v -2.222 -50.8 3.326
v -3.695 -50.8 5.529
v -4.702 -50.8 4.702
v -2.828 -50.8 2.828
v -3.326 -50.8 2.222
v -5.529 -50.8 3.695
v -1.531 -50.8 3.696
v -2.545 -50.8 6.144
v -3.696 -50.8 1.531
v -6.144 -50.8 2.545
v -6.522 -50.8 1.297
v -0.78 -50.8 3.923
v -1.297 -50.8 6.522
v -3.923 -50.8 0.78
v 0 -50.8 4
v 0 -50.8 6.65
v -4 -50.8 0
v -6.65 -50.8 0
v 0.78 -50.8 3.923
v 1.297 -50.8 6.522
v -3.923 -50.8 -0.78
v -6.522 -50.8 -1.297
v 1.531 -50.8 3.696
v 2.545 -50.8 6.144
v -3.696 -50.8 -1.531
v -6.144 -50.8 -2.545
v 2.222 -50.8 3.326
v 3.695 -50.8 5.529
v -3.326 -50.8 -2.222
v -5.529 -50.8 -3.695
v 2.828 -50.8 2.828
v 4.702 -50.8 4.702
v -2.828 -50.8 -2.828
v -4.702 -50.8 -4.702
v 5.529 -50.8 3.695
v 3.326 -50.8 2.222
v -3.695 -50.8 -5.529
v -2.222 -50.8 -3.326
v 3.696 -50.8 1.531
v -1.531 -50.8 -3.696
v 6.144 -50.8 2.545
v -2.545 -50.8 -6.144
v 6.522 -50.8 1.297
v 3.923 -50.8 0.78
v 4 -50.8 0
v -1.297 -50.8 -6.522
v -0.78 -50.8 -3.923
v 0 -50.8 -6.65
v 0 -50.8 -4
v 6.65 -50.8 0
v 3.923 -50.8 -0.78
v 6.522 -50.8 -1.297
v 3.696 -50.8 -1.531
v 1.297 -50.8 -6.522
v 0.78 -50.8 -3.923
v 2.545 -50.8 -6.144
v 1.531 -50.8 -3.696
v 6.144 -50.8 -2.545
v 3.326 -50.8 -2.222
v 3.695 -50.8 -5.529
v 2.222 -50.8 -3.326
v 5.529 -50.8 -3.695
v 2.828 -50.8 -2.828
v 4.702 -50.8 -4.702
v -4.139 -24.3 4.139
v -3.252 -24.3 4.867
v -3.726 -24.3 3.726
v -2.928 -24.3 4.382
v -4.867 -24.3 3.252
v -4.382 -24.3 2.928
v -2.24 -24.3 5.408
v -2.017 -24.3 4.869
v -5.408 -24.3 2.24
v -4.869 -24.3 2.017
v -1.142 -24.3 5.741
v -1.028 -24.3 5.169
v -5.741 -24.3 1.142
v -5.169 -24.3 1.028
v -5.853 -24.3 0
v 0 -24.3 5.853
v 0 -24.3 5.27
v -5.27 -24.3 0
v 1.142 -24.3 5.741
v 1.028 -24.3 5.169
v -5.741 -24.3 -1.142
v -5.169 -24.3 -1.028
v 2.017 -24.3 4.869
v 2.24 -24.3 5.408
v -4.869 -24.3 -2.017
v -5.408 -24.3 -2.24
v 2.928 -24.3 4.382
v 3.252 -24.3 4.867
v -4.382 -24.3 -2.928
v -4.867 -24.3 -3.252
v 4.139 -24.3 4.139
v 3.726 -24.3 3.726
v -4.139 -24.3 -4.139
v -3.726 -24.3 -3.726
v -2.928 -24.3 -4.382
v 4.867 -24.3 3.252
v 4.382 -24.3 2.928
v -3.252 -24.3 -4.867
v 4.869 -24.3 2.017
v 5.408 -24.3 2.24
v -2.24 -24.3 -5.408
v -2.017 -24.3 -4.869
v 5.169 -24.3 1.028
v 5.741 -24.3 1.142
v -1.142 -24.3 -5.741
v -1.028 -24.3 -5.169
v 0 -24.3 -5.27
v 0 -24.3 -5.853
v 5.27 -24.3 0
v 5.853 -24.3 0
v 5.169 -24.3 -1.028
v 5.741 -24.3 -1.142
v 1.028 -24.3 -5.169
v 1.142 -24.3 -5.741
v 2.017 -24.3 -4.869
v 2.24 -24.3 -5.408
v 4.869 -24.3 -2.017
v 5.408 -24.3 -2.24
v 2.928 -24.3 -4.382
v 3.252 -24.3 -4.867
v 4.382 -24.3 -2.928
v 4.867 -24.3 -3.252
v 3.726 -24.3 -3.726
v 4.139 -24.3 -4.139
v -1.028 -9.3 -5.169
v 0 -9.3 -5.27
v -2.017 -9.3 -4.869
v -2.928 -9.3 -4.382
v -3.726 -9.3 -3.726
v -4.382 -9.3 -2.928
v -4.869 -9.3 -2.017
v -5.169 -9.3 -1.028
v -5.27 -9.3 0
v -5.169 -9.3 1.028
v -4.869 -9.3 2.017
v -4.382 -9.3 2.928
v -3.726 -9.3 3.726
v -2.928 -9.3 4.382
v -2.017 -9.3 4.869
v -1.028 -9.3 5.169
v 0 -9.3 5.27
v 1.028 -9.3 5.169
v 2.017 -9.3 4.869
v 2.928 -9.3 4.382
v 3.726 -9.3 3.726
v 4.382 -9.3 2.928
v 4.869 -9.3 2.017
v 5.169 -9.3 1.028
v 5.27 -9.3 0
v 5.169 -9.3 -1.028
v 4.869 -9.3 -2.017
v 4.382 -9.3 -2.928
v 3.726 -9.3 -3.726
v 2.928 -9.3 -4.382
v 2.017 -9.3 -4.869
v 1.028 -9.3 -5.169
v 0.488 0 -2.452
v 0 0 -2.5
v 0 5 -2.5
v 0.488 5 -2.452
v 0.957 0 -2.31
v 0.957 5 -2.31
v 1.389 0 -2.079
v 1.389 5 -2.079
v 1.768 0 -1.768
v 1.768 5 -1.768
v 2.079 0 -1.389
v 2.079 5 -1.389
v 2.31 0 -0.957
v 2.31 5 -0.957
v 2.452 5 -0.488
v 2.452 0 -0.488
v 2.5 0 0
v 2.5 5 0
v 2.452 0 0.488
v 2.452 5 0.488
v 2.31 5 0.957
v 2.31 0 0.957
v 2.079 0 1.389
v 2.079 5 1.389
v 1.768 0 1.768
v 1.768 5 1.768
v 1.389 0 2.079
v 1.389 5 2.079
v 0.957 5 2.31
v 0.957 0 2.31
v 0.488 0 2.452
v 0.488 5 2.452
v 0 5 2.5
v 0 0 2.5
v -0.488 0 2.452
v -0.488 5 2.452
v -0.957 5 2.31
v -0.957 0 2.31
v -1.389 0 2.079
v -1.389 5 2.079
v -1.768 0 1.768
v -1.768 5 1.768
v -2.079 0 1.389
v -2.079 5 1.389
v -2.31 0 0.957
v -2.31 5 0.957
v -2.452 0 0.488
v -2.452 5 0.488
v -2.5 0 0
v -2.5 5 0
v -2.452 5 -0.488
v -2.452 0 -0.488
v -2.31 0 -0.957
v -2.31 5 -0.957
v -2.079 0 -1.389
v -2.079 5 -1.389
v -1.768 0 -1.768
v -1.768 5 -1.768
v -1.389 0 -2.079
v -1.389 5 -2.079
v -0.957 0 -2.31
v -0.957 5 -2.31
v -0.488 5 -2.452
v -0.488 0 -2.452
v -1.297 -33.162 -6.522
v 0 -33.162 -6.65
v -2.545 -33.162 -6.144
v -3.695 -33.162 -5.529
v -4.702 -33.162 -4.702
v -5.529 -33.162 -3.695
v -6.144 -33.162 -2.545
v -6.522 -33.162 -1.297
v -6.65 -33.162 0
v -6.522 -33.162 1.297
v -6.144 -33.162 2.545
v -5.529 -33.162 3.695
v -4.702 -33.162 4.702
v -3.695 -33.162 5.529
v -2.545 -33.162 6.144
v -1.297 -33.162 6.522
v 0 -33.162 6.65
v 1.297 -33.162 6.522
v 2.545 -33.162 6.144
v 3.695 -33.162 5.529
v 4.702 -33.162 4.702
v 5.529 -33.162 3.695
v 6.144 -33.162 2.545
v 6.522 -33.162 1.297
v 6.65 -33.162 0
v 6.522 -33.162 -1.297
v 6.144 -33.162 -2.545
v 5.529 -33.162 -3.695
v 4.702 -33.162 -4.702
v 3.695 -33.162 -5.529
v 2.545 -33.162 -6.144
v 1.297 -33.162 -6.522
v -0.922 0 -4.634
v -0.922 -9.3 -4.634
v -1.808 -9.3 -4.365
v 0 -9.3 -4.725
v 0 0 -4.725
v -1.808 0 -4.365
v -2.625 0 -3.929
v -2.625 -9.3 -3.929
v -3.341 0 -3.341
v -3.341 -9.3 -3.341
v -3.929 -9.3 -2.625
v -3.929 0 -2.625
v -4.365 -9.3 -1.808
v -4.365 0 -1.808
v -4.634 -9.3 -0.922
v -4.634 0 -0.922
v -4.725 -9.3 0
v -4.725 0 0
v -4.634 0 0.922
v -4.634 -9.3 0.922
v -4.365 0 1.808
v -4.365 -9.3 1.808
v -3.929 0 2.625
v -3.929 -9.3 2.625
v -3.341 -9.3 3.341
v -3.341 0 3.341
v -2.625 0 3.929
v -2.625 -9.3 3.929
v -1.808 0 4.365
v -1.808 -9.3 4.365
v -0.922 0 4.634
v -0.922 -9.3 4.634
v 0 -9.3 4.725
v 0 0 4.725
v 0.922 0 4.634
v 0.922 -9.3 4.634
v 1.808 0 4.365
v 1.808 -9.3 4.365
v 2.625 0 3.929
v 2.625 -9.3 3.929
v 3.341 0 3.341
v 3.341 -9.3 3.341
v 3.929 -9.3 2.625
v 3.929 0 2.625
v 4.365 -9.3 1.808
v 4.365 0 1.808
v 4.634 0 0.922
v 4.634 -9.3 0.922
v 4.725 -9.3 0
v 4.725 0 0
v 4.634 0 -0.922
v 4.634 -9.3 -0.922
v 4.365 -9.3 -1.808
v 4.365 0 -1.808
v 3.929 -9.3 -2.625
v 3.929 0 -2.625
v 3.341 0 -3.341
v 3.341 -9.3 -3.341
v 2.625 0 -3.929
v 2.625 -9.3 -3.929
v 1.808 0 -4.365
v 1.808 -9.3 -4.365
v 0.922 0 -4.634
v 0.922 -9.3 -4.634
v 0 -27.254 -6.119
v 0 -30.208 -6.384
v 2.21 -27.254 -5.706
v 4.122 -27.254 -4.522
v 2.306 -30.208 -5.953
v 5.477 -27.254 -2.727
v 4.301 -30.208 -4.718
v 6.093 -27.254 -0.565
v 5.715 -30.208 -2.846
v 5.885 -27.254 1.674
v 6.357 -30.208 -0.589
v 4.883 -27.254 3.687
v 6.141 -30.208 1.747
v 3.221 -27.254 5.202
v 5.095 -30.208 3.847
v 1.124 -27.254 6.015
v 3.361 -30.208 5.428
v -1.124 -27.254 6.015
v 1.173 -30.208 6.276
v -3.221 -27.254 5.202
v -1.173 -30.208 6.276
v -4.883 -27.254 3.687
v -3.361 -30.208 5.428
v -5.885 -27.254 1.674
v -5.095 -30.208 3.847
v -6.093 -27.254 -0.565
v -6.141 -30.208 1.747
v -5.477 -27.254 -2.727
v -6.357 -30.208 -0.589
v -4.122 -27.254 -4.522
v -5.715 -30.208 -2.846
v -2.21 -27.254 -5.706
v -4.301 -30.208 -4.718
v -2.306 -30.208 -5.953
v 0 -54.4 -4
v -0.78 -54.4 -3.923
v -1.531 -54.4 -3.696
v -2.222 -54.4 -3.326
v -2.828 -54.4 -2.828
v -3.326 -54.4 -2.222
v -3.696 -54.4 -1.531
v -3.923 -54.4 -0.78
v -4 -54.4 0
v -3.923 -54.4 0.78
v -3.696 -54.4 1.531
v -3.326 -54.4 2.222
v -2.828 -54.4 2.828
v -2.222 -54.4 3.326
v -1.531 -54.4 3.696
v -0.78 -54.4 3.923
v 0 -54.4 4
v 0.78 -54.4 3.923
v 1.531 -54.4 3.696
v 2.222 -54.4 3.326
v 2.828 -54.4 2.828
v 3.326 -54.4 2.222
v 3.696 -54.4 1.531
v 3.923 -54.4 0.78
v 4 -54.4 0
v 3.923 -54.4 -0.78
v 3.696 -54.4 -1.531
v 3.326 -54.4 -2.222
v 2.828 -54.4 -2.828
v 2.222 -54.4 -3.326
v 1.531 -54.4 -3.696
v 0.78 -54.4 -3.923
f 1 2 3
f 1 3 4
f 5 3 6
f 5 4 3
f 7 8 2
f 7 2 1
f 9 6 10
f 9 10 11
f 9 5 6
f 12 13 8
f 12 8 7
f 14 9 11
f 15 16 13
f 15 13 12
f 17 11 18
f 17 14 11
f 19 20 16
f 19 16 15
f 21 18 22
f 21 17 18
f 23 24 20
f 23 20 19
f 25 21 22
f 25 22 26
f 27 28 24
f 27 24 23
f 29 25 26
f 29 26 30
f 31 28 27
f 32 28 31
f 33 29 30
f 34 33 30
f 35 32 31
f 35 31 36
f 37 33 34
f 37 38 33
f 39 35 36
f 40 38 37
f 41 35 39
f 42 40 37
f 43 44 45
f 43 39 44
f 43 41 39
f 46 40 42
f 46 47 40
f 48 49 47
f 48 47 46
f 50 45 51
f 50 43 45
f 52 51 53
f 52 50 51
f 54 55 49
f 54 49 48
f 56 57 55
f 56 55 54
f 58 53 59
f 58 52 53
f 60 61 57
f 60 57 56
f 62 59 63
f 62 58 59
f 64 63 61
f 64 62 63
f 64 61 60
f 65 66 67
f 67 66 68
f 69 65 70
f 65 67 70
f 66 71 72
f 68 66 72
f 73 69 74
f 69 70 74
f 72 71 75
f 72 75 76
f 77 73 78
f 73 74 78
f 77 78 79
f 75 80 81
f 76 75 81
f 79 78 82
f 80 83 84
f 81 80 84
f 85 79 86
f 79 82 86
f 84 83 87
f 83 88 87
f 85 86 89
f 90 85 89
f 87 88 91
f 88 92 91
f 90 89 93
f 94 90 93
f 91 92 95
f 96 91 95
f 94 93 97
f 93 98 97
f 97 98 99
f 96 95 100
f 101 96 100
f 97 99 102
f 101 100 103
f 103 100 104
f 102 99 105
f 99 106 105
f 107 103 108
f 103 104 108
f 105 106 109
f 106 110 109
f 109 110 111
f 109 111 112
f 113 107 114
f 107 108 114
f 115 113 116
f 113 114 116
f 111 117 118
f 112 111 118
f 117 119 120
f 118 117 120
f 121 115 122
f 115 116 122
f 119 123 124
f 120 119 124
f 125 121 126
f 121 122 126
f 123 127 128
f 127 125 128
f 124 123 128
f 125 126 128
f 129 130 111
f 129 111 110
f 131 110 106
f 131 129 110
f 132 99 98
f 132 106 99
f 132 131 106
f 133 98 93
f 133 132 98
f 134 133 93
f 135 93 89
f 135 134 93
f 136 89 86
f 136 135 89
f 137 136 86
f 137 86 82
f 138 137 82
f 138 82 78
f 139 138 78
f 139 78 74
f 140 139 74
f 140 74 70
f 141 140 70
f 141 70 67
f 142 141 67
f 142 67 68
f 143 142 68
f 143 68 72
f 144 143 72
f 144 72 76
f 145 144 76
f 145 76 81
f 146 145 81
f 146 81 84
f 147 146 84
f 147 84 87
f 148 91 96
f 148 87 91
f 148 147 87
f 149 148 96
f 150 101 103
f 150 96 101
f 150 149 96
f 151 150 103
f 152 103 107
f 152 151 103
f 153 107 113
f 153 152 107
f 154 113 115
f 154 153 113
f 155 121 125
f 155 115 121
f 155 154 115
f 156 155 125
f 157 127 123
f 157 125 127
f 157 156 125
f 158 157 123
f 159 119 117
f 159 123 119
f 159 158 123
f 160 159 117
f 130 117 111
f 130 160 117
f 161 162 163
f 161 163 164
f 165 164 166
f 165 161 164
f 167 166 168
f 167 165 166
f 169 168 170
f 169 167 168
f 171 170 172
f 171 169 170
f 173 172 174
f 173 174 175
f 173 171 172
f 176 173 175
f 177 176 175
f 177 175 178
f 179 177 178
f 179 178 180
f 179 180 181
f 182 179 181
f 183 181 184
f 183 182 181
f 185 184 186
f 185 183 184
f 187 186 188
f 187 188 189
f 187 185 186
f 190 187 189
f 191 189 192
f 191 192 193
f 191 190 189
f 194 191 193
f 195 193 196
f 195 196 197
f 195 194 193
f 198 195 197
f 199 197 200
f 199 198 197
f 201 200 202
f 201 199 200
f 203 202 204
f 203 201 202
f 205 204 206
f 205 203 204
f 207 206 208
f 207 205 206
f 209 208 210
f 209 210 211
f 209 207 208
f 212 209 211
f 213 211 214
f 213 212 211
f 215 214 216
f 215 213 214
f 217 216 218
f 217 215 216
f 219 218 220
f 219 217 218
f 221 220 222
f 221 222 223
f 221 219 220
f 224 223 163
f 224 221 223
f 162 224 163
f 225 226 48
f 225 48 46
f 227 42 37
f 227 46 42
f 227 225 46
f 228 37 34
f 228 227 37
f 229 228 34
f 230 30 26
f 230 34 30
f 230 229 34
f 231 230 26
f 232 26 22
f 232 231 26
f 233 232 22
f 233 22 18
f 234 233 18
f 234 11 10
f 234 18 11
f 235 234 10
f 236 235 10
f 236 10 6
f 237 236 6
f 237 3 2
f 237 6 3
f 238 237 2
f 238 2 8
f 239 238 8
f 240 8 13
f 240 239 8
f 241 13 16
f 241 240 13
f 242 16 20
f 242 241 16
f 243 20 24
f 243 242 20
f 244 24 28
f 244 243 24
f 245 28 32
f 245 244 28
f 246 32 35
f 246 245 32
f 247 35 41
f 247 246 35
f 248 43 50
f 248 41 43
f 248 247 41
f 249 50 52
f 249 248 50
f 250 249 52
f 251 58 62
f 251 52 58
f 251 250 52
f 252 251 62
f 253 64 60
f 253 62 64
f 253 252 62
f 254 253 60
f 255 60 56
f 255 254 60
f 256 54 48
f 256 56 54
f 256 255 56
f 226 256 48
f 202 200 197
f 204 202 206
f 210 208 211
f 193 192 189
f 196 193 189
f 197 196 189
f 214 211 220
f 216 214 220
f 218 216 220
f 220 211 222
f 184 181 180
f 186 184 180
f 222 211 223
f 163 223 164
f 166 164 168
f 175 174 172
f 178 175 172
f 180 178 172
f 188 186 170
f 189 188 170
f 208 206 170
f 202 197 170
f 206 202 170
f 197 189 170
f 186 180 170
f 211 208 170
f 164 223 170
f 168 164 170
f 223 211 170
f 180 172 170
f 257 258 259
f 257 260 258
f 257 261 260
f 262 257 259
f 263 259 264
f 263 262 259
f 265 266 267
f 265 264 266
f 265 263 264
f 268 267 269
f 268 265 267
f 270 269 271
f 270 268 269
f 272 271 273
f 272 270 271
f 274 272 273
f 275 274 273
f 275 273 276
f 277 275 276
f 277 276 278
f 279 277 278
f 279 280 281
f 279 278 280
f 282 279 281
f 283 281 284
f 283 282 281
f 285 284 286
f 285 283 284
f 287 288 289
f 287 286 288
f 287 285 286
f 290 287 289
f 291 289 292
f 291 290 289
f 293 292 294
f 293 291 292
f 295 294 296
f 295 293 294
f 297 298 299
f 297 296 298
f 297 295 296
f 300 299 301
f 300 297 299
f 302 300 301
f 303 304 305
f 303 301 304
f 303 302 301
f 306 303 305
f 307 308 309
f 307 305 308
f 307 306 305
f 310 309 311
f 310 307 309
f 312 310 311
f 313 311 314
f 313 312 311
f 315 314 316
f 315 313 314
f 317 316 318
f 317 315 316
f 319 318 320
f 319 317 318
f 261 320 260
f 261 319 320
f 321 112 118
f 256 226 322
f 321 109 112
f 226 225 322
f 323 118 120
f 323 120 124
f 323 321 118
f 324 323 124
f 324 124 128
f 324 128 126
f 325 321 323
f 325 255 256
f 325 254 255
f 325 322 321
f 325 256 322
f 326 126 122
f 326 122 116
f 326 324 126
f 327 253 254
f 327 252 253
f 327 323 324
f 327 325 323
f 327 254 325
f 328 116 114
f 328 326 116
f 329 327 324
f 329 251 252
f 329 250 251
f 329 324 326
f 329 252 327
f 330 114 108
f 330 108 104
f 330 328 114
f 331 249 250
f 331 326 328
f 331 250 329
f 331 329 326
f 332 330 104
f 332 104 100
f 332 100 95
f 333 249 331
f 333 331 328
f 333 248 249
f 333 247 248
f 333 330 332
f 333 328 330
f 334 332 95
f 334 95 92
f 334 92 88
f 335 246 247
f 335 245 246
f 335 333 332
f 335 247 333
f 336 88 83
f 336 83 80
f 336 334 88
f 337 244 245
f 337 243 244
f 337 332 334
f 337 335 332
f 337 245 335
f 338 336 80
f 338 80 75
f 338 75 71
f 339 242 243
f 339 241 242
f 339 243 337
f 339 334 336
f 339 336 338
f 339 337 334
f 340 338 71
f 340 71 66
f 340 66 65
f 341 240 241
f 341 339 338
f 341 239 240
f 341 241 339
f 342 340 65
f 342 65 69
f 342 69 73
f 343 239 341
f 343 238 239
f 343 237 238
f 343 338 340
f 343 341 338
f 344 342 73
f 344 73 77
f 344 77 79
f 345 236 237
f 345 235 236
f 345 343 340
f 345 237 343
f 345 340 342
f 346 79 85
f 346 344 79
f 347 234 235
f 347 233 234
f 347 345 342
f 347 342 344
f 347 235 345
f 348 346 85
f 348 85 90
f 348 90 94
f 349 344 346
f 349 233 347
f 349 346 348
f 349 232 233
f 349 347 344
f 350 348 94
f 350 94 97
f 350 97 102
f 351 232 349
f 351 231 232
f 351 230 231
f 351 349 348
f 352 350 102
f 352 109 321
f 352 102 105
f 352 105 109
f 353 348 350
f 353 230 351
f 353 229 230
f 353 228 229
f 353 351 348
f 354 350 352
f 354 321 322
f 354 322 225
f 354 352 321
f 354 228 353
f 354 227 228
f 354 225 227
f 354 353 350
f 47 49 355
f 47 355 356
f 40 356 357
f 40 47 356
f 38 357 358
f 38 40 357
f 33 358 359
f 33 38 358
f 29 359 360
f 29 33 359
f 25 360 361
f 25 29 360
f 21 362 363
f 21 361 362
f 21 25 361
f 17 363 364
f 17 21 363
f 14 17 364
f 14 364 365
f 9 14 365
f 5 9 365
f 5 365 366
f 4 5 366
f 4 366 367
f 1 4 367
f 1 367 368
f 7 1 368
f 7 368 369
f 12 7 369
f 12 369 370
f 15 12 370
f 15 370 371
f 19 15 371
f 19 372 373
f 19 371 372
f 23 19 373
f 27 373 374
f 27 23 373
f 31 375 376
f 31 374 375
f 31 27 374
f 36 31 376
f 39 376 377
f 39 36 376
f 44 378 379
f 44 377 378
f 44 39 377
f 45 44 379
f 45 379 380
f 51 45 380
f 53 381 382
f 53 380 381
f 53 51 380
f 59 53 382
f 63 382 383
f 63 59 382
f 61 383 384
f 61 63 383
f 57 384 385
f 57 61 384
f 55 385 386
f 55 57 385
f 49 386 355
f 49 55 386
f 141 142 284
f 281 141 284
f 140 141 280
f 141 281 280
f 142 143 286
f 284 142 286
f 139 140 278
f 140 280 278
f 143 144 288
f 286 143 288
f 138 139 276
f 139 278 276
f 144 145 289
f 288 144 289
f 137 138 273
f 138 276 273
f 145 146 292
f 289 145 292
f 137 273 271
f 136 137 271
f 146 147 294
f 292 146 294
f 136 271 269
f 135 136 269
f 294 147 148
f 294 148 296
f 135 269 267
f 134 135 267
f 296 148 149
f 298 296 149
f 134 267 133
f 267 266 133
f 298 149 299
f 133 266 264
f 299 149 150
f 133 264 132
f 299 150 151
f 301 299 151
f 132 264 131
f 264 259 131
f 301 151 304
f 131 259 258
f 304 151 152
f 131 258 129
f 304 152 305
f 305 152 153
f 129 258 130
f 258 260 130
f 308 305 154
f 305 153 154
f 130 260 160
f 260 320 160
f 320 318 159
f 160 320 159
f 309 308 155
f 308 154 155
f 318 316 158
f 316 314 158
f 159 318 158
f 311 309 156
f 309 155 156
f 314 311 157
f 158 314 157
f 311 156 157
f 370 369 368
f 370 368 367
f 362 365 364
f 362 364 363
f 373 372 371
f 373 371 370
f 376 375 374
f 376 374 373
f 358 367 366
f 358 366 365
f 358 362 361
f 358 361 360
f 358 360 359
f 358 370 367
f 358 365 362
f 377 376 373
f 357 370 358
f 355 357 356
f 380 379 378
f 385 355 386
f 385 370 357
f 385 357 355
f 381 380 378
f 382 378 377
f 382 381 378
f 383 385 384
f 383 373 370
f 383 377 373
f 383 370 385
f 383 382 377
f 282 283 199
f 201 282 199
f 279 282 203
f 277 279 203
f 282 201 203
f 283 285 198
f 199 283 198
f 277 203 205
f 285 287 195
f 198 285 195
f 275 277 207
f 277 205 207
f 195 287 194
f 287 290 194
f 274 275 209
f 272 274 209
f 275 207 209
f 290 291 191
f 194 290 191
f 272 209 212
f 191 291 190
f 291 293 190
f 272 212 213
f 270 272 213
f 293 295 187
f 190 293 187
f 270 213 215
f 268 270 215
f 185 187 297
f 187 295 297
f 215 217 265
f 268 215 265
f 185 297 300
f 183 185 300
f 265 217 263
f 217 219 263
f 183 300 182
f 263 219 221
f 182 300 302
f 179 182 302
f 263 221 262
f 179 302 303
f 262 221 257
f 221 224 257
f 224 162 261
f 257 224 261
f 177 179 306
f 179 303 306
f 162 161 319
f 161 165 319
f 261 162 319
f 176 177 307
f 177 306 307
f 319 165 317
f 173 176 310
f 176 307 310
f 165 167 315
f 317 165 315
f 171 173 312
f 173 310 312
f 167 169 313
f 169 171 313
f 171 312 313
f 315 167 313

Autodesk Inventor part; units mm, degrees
ref_plane "YZ Plane" through (0, 0, 0) normal (1, 0, 0) x (0, 1, 0)
ref_plane "XZ Plane" through (0, 0, 0) normal (0, 1, 0) x (-1, 0, 0)
ref_plane "XY Plane" through (0, 0, 0) normal (0, 0, 1) x (1, 0, 0)
sketch "Sketch1" plane through (0, 0, 0) normal (1, 0, 0) x (0, 1, 0)
  line L0 (0, 0) -> (-9.3, 0)
  line L1 (-9.3, 0) -> (-9.3, -4.725)
  line L2 (-9.3, -4.725) -> (0, -4.725)
  line L3 (0, -4.725) -> (0, 0)
  line L4 (0, 0) -> (5, 0)
  line L5 (5, 0) -> (5, -2.5)
  line L6 (5, -2.5) -> (0, -2.5)
  line L7 (0, -2.5) -> (0, 0)
  line L8 (-9.3, 0) -> (-24.3, 0)
  line L9 (-24.3, 0) -> (-24.3, -5.27)
  line L10 (-24.3, -5.27) -> (-9.3, -5.27)
  line L11 (-9.3, -5.27) -> (-9.3, 0)
  line L12 (-24.3, 0) -> (-50.8, 0)
  line L13 (-50.8, 0) -> (-50.8, -6.65)
  line L14 (-50.8, -6.65) -> (-24.3, -6.65)
  line L15 (-24.3, -5.8531) -> (-24.3, 0)
  line L16 (-50.8, 0) -> (-54.4, 0)
  line L17 (-54.4, 0) -> (-54.4, -4)
  line L18 (-54.4, -4) -> (-50.8, -4)
  line L19 (-50.8, -4) -> (-50.8, 0)
  line L20 (-24.3, -5.8531) -> (-33.1623, -6.65)
  dimension "d0" = 9.3
  dimension "d1" = 4.725
  dimension "d2" = 5
  dimension "d3" = 2.5
  dimension "d4" = 15
  dimension "d5" = 26.5
  dimension "d6" = 6.65
  dimension "d7" = 5.27
  dimension "d8" = 3.6
  dimension "d9" = 4
revolve "Revolution1" add sketch "Sketch1" angle 360 about axis through (0, -9.3, 0) along (0, -1, 0)
properties part number "00_micrometer_xy-stage"
